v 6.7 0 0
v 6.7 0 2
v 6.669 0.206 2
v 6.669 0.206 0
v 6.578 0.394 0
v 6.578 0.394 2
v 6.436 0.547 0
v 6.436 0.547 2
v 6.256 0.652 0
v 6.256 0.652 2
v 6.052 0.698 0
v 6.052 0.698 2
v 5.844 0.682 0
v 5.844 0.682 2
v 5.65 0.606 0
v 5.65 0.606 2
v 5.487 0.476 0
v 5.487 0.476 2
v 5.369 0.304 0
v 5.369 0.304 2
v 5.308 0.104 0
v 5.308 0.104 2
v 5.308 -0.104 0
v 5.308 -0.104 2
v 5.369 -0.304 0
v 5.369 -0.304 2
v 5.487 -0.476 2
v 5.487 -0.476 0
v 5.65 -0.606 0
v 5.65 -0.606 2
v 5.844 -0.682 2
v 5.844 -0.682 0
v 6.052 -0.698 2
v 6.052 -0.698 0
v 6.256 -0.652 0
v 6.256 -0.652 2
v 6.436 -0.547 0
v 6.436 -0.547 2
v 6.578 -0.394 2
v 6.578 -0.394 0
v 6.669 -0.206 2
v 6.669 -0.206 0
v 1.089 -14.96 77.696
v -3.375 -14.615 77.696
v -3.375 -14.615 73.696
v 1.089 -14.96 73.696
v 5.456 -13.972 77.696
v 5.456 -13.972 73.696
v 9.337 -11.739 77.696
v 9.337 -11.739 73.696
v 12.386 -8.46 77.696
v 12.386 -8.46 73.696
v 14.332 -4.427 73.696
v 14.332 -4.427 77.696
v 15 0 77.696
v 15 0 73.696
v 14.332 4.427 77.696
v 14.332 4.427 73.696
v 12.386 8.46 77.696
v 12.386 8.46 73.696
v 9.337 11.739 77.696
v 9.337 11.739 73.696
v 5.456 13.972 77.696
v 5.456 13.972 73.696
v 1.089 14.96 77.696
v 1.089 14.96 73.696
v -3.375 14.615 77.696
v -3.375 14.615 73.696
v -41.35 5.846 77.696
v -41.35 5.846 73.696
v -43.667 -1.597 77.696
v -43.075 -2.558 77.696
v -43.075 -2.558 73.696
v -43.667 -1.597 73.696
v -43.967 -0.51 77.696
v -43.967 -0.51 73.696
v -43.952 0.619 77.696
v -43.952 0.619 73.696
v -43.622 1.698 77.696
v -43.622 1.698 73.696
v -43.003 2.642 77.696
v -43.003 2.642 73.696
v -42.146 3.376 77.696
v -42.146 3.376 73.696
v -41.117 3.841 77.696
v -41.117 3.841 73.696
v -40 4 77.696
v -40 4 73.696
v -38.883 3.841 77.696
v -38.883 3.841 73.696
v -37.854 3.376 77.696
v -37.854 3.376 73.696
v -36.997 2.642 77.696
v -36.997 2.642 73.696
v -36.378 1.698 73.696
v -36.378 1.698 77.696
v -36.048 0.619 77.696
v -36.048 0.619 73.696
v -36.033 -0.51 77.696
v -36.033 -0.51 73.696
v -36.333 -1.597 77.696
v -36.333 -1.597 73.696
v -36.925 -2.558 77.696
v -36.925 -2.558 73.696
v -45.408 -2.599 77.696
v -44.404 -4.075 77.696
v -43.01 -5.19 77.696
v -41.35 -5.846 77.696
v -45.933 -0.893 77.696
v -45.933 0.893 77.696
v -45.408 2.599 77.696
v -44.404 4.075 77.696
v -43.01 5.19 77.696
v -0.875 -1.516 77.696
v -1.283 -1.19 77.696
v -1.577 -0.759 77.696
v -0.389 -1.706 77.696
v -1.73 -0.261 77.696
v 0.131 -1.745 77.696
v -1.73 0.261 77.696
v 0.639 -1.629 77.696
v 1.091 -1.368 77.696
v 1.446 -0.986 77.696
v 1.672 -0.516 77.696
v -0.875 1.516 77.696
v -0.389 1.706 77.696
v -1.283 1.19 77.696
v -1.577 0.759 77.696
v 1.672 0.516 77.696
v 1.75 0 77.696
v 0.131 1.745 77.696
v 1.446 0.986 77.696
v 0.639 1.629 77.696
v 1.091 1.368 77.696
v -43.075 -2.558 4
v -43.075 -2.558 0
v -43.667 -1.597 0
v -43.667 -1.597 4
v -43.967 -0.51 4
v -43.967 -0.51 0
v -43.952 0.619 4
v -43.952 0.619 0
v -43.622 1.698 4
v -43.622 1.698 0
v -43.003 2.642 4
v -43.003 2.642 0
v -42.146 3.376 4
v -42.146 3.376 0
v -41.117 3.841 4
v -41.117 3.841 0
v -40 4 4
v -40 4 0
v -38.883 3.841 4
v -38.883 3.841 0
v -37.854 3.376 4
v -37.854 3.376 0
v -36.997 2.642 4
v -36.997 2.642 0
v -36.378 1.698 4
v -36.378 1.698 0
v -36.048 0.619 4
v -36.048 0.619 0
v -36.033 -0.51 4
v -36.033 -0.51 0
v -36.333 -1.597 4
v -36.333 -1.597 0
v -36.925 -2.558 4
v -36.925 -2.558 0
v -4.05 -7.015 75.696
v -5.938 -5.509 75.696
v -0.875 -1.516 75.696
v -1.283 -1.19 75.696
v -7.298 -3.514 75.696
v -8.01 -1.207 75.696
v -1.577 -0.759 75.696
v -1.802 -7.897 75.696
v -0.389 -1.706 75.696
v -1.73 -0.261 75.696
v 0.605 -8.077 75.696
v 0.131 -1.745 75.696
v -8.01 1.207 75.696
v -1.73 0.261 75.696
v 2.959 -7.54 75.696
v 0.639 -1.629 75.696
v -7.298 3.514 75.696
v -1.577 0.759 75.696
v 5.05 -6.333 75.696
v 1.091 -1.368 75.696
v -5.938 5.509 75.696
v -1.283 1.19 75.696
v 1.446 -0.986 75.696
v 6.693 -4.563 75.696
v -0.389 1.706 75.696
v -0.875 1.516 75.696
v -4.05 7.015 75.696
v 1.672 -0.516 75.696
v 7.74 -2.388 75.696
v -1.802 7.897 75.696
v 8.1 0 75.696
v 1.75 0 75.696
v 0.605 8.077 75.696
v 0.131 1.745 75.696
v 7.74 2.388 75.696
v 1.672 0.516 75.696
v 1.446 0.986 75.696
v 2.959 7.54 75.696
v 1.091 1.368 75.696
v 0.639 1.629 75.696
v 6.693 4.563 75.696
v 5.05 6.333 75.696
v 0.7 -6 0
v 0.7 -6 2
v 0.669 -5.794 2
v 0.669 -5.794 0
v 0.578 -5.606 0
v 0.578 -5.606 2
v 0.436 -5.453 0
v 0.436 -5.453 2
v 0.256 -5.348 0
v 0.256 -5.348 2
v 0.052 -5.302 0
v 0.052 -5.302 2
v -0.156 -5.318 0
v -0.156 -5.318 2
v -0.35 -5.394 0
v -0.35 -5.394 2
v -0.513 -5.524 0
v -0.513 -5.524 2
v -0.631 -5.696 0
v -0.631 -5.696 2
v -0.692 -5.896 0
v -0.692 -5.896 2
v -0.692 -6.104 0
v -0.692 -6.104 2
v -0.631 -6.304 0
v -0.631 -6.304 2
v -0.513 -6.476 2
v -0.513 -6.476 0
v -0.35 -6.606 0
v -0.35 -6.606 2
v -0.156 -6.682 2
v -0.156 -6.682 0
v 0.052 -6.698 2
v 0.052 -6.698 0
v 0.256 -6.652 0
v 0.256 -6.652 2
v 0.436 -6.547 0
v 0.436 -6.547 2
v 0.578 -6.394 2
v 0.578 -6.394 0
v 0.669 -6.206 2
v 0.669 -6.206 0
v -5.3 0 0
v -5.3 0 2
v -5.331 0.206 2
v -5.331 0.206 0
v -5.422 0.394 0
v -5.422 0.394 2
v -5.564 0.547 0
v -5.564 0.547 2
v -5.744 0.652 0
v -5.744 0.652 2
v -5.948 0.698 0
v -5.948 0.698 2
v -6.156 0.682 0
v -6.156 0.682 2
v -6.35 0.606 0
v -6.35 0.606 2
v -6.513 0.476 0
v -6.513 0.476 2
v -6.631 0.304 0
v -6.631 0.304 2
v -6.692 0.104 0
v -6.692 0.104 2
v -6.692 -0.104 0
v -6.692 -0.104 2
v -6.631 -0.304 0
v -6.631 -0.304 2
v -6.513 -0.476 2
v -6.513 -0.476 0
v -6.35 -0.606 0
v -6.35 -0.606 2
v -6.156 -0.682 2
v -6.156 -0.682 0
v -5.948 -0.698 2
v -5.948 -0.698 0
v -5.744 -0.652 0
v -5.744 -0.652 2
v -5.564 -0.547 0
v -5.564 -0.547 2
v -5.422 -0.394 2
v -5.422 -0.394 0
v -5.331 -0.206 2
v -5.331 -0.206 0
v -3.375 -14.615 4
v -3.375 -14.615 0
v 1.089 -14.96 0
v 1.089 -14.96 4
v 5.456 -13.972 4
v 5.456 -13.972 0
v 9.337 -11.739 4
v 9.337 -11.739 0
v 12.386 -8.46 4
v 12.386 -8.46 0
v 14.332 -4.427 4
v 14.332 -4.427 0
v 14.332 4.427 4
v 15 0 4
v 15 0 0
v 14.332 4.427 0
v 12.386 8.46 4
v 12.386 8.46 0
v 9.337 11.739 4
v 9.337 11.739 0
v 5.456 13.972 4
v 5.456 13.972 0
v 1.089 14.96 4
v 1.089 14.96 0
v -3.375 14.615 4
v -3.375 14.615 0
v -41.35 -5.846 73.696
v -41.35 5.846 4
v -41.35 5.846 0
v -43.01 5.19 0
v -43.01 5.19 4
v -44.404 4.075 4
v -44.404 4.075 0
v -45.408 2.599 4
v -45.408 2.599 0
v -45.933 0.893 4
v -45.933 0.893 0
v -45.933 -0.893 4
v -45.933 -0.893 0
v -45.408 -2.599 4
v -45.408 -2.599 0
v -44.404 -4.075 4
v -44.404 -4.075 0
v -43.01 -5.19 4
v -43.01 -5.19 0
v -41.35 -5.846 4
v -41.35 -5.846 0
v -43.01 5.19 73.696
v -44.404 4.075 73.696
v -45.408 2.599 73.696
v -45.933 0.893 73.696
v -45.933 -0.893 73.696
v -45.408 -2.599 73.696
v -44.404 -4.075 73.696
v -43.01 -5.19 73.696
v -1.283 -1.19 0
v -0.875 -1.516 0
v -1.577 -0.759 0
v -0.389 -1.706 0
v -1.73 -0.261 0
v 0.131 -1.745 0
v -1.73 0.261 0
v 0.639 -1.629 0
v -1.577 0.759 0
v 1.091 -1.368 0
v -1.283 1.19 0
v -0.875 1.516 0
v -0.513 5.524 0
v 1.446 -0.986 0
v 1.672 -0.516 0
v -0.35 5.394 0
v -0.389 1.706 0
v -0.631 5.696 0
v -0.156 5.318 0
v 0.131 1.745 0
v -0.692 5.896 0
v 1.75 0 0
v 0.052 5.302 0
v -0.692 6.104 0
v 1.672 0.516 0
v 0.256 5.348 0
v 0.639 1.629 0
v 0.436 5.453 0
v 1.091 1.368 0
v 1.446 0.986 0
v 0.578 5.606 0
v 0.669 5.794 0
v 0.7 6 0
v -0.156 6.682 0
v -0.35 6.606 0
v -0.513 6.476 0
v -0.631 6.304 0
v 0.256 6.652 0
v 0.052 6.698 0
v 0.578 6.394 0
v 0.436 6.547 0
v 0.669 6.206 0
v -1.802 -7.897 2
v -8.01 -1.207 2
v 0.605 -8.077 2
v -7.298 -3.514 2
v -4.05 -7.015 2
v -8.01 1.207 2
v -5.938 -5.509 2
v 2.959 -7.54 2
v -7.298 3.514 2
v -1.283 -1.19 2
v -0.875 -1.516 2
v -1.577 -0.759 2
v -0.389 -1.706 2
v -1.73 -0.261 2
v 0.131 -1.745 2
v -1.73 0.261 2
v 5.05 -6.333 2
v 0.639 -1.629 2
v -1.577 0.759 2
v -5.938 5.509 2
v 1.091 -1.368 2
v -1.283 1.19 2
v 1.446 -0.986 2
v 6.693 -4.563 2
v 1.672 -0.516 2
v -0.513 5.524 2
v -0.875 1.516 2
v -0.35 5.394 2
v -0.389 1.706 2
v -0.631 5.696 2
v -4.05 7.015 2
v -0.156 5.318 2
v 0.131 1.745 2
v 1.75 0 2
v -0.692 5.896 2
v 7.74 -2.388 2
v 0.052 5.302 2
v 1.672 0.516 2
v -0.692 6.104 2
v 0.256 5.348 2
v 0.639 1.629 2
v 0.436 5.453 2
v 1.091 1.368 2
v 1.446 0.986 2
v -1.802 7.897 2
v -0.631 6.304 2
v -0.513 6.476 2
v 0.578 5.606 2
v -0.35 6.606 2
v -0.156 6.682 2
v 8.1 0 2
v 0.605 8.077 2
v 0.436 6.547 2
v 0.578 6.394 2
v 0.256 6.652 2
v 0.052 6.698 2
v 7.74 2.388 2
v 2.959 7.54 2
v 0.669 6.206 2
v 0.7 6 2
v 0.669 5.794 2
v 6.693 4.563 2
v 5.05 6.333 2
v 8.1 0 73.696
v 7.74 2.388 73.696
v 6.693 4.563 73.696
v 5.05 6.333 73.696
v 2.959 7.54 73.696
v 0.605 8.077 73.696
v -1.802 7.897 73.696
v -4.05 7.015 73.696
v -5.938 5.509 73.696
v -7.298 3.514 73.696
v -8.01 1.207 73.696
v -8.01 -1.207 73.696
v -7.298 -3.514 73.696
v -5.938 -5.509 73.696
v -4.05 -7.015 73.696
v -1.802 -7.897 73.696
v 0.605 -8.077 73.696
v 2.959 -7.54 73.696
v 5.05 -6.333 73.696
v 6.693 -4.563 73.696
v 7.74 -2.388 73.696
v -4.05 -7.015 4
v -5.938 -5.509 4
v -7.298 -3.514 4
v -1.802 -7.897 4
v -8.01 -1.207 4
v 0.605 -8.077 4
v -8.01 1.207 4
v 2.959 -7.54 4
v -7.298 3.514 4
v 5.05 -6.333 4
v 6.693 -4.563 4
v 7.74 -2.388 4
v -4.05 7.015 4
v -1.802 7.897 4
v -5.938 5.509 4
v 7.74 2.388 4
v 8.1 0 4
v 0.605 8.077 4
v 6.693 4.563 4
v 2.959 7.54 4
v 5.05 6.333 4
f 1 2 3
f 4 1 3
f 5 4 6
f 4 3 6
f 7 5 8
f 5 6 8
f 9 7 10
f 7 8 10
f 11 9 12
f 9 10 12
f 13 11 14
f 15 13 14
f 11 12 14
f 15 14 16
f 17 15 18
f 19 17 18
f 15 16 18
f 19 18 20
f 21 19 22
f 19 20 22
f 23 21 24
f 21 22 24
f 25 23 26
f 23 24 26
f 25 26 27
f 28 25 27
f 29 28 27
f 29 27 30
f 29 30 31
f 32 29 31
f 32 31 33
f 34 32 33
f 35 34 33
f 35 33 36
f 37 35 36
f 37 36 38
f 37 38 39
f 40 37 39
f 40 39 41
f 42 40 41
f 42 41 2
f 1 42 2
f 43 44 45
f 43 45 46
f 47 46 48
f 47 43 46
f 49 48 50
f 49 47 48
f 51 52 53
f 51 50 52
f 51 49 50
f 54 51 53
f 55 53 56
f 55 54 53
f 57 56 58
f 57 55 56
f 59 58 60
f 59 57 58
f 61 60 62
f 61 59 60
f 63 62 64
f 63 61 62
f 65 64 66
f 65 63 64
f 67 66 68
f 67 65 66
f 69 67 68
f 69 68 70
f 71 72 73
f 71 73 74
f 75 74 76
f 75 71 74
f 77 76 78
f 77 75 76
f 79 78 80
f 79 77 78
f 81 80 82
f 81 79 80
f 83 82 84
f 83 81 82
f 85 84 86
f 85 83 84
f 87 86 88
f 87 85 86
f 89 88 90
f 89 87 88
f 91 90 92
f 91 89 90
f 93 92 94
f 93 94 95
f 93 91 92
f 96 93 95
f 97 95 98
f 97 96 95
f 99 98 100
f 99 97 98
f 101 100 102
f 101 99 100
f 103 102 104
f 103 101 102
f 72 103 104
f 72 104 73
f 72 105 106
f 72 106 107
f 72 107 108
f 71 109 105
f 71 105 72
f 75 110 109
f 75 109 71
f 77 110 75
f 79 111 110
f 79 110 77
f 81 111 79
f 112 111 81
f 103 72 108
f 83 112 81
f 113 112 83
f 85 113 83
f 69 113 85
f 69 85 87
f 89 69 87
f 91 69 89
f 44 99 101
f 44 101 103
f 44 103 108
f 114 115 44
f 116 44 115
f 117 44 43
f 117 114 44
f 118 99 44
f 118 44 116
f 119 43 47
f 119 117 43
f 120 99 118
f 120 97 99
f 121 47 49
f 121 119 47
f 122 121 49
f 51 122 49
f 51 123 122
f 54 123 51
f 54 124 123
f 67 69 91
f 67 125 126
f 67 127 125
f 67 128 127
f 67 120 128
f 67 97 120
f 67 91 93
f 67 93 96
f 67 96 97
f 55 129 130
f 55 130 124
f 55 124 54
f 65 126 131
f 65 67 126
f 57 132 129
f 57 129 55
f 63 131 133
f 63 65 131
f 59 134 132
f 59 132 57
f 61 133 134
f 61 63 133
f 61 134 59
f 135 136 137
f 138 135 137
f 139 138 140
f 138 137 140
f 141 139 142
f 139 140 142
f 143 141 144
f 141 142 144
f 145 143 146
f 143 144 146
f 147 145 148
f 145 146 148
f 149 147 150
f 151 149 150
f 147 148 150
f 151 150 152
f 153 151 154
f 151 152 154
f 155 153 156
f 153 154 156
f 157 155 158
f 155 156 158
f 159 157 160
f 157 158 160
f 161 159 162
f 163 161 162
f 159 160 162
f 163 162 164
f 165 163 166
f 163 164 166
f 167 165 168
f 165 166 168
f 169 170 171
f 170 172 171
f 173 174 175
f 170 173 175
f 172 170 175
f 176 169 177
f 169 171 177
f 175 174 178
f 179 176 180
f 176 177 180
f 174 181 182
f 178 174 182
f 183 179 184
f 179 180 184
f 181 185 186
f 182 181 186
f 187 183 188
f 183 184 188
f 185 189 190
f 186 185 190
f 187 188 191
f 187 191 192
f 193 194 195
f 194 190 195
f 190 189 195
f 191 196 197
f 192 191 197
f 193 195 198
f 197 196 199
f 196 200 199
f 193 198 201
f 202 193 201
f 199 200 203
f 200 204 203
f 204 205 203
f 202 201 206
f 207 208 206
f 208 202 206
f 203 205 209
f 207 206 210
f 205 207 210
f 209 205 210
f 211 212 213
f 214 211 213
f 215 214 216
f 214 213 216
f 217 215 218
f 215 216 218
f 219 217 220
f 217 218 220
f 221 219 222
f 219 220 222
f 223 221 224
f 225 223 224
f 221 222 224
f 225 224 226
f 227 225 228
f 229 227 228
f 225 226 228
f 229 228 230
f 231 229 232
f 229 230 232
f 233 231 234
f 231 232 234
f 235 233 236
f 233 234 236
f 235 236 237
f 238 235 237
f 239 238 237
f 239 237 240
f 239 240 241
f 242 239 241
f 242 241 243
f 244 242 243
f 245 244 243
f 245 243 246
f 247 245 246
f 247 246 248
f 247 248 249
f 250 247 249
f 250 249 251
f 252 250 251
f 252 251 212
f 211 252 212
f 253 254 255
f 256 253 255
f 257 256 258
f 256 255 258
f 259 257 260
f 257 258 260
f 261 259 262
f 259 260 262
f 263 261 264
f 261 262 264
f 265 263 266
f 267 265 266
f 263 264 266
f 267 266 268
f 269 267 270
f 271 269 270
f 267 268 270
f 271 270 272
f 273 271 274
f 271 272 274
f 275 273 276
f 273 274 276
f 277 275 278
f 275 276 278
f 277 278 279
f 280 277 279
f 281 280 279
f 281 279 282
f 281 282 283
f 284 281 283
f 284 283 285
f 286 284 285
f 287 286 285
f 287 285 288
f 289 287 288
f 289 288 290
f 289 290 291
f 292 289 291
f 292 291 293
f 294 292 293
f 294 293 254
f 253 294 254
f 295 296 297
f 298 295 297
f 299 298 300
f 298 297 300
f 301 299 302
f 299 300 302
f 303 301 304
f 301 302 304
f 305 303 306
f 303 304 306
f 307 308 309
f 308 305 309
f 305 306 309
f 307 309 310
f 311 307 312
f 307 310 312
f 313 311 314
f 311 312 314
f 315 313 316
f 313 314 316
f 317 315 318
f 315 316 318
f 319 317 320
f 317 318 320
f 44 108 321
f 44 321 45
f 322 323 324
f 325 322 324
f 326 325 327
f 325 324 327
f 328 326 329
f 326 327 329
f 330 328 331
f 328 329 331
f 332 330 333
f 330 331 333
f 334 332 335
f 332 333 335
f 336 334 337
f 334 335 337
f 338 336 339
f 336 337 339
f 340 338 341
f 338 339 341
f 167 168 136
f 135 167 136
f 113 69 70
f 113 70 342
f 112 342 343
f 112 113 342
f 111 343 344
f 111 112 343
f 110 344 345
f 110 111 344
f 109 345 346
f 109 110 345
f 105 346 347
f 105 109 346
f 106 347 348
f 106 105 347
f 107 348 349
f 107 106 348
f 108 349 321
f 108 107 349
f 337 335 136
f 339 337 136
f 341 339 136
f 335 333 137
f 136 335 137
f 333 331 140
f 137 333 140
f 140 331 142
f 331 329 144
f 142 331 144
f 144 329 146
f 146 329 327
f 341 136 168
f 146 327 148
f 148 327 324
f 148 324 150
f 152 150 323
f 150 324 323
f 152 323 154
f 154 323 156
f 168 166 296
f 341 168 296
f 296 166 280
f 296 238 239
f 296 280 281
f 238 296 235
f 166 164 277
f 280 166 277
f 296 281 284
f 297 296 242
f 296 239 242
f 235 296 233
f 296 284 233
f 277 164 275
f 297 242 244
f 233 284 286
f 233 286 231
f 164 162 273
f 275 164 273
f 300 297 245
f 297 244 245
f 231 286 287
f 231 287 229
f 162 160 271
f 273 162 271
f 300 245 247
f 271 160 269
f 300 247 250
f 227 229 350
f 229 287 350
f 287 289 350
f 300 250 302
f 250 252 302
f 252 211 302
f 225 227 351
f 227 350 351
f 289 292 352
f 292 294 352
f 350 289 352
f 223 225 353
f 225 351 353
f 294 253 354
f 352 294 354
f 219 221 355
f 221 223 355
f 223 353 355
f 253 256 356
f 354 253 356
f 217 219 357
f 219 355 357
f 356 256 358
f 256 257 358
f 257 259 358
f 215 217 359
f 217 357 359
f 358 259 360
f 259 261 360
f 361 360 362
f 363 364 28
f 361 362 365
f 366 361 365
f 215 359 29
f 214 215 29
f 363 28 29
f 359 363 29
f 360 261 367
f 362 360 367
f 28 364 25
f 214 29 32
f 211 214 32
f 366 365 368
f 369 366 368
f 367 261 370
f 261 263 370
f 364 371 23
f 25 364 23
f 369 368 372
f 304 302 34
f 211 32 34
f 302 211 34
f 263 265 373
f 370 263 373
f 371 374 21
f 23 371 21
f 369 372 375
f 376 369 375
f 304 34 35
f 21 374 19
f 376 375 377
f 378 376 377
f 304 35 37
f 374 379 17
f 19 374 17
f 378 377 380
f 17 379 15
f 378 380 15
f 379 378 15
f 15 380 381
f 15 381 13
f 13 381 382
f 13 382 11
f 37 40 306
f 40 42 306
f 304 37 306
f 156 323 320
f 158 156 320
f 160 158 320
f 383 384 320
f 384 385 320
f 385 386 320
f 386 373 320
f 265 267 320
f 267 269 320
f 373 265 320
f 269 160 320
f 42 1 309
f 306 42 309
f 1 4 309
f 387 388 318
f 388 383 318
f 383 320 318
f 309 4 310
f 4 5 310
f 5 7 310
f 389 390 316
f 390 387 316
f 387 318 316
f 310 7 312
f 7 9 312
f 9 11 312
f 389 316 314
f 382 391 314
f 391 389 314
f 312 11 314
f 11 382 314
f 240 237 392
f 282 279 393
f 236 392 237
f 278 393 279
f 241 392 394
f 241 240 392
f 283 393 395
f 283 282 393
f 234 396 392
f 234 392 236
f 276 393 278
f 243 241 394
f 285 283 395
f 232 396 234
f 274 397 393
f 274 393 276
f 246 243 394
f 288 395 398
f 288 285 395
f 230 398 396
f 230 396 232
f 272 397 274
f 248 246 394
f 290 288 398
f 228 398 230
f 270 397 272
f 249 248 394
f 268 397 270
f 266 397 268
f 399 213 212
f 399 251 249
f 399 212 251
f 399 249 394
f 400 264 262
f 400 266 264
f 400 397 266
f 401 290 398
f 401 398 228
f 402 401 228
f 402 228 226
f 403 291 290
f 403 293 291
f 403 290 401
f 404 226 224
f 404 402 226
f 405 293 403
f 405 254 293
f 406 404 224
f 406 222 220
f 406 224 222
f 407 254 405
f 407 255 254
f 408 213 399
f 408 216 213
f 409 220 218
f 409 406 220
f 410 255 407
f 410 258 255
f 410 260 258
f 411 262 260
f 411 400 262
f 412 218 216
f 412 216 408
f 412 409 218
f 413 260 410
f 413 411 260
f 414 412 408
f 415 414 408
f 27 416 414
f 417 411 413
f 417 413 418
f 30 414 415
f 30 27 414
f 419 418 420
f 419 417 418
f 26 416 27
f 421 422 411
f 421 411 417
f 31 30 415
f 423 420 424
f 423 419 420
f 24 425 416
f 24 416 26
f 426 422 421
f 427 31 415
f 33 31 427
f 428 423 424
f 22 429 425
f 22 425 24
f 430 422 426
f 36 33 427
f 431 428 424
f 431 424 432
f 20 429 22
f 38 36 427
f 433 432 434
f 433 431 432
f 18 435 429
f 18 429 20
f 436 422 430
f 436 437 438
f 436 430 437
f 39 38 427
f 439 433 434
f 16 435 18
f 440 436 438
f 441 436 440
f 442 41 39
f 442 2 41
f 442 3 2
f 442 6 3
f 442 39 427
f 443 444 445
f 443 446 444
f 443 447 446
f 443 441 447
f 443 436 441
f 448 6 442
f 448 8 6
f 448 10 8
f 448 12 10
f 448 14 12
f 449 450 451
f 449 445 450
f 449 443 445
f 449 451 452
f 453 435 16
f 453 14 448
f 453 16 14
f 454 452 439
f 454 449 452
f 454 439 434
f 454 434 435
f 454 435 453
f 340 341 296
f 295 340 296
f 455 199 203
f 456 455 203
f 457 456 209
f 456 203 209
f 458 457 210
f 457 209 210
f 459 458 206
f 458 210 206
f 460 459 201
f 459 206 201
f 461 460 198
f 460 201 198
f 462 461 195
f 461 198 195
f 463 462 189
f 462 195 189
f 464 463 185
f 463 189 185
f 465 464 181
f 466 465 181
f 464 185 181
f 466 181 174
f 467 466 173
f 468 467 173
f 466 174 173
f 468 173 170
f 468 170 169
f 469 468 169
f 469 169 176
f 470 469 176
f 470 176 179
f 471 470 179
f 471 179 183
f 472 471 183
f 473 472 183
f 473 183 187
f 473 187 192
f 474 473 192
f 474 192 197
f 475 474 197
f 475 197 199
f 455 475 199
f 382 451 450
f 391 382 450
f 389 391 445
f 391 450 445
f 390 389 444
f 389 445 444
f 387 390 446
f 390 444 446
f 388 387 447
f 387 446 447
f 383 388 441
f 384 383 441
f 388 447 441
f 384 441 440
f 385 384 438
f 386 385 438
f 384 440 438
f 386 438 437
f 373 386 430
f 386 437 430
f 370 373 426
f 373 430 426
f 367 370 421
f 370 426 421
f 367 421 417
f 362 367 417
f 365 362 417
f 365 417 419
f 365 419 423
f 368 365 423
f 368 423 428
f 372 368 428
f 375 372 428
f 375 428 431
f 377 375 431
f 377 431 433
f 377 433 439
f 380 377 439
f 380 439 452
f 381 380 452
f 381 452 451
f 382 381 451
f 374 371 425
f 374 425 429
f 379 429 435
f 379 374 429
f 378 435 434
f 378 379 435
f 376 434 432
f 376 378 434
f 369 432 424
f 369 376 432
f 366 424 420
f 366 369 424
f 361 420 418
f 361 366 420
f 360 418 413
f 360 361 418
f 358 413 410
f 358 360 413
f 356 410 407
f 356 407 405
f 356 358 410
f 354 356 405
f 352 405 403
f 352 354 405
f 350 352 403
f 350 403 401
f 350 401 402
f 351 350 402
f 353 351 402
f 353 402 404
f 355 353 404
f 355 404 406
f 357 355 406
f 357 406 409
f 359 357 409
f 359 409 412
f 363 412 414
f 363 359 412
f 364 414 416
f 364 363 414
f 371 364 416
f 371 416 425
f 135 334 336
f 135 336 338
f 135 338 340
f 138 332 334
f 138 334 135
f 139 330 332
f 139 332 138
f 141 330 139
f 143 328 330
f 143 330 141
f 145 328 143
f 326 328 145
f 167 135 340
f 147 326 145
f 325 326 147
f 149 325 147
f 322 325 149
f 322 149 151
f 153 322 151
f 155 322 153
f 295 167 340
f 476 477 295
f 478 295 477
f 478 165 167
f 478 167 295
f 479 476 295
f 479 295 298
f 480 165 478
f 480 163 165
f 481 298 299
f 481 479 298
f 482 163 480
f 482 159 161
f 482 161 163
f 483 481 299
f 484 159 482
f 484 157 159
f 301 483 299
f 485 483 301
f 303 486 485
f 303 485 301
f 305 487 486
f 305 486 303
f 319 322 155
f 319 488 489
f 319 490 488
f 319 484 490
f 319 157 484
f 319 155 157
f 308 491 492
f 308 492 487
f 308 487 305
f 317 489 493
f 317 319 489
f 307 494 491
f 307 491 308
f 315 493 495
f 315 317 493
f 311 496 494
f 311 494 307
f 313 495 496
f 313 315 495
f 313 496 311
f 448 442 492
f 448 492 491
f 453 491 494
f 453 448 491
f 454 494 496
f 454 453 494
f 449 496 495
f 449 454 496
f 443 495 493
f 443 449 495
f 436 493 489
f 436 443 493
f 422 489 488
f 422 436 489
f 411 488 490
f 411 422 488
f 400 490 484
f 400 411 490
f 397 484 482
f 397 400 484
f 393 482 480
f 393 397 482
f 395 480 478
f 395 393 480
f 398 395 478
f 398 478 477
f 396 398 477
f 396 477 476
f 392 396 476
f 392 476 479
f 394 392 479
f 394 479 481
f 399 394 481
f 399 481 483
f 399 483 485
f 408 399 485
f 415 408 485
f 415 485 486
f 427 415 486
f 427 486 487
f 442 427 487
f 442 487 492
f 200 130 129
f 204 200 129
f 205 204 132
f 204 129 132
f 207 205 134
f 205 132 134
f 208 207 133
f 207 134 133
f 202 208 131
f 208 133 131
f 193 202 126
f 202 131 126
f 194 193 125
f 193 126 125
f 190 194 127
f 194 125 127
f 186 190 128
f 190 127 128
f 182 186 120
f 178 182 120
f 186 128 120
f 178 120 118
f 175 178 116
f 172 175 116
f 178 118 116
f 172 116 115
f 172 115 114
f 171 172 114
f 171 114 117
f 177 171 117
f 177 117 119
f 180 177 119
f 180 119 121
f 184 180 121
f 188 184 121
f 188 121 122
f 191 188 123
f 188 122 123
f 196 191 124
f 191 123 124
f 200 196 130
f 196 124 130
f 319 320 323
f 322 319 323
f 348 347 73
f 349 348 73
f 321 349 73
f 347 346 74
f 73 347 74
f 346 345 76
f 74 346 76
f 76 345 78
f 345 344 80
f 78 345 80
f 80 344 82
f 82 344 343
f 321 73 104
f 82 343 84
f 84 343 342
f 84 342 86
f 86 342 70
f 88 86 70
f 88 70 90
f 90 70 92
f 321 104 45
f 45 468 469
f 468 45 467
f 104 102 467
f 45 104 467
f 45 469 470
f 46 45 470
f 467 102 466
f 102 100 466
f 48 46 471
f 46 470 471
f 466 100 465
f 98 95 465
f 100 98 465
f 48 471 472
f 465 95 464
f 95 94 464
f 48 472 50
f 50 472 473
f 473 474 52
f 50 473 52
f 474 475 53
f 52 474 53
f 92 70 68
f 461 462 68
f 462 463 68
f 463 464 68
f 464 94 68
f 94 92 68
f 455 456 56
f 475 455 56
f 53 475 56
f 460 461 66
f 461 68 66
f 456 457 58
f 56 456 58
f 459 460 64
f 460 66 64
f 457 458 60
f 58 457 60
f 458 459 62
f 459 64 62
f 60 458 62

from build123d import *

# Parameters (mm, degrees)
SKETCH1_R           = 15
SKETCH1_R_2         = 8.1
BOSS_EXTRUDE1_DEPTH = 4
SKETCH1_3_R         = 8.1
SKETCH1_3_R_2       = 1.75
BOSS_EXTRUDE2_DEPTH = 2
BOSS_EXTRUDE3_DEPTH = 4
SKETCH3_R           = 0.7
CUT_EXTRUDE1_DEPTH  = 10


with BuildPart() as part:
    # Sketch1 → Boss-Extrude1 (new body)
    with BuildSketch(Plane.XY):
        Circle(SKETCH1_R)
        Circle(SKETCH1_R_2, mode=Mode.SUBTRACT)
    extrude(amount=BOSS_EXTRUDE1_DEPTH)

    # Sketch1<3> → Boss-Extrude2 (add)
    with BuildSketch(Plane.XY):
        Circle(SKETCH1_3_R)
        Circle(SKETCH1_3_R_2, mode=Mode.SUBTRACT)
    extrude(amount=BOSS_EXTRUDE2_DEPTH)

    # Sketch2 → Boss-Extrude3 (add)
    with BuildSketch(Plane.XY):
        with BuildLine():
            Line((-3.375, 14.615381452), (-41.35, 5.846152581))
            ThreePointArc((-41.35, 5.846152581), (-46, 0), (-41.35, -5.846152581))
            Line((-41.35, -5.846152581), (-3.375, -14.615381452))
            ThreePointArc((-3.375, -14.615381452), (-15, 0), (-3.375, 14.615381452))
        make_face()
        with BuildLine():
            Line((-36.925, -2.558197608), (-43.075, -2.558197608))
            ThreePointArc((-43.075, -2.558197608), (-40, 4), (-36.925, -2.558197608))
        make_face(mode=Mode.SUBTRACT)
    extrude(amount=BOSS_EXTRUDE3_DEPTH)


with BuildPart() as body_2:
    # Mirror2: mirrored copy
    add(part.part.mirror(Plane.XY.offset(38.847994838)))


with BuildPart() as part_1:
    add(part.part)

    # Sketch3 → Cut-Extrude1 (cut)
    with BuildSketch(Plane.XY.offset(2)):
        with Locations((0, 6)):
            Circle(SKETCH3_R)
        with Locations((6, 0)):
            Circle(SKETCH3_R)
        with Locations((0, -6)):
            Circle(SKETCH3_R)
        with Locations((-6, 0)):
            Circle(SKETCH3_R)
    extrude(amount=-CUT_EXTRUDE1_DEPTH, mode=Mode.SUBTRACT)


solid = Compound([body_2.part, part_1.part])
